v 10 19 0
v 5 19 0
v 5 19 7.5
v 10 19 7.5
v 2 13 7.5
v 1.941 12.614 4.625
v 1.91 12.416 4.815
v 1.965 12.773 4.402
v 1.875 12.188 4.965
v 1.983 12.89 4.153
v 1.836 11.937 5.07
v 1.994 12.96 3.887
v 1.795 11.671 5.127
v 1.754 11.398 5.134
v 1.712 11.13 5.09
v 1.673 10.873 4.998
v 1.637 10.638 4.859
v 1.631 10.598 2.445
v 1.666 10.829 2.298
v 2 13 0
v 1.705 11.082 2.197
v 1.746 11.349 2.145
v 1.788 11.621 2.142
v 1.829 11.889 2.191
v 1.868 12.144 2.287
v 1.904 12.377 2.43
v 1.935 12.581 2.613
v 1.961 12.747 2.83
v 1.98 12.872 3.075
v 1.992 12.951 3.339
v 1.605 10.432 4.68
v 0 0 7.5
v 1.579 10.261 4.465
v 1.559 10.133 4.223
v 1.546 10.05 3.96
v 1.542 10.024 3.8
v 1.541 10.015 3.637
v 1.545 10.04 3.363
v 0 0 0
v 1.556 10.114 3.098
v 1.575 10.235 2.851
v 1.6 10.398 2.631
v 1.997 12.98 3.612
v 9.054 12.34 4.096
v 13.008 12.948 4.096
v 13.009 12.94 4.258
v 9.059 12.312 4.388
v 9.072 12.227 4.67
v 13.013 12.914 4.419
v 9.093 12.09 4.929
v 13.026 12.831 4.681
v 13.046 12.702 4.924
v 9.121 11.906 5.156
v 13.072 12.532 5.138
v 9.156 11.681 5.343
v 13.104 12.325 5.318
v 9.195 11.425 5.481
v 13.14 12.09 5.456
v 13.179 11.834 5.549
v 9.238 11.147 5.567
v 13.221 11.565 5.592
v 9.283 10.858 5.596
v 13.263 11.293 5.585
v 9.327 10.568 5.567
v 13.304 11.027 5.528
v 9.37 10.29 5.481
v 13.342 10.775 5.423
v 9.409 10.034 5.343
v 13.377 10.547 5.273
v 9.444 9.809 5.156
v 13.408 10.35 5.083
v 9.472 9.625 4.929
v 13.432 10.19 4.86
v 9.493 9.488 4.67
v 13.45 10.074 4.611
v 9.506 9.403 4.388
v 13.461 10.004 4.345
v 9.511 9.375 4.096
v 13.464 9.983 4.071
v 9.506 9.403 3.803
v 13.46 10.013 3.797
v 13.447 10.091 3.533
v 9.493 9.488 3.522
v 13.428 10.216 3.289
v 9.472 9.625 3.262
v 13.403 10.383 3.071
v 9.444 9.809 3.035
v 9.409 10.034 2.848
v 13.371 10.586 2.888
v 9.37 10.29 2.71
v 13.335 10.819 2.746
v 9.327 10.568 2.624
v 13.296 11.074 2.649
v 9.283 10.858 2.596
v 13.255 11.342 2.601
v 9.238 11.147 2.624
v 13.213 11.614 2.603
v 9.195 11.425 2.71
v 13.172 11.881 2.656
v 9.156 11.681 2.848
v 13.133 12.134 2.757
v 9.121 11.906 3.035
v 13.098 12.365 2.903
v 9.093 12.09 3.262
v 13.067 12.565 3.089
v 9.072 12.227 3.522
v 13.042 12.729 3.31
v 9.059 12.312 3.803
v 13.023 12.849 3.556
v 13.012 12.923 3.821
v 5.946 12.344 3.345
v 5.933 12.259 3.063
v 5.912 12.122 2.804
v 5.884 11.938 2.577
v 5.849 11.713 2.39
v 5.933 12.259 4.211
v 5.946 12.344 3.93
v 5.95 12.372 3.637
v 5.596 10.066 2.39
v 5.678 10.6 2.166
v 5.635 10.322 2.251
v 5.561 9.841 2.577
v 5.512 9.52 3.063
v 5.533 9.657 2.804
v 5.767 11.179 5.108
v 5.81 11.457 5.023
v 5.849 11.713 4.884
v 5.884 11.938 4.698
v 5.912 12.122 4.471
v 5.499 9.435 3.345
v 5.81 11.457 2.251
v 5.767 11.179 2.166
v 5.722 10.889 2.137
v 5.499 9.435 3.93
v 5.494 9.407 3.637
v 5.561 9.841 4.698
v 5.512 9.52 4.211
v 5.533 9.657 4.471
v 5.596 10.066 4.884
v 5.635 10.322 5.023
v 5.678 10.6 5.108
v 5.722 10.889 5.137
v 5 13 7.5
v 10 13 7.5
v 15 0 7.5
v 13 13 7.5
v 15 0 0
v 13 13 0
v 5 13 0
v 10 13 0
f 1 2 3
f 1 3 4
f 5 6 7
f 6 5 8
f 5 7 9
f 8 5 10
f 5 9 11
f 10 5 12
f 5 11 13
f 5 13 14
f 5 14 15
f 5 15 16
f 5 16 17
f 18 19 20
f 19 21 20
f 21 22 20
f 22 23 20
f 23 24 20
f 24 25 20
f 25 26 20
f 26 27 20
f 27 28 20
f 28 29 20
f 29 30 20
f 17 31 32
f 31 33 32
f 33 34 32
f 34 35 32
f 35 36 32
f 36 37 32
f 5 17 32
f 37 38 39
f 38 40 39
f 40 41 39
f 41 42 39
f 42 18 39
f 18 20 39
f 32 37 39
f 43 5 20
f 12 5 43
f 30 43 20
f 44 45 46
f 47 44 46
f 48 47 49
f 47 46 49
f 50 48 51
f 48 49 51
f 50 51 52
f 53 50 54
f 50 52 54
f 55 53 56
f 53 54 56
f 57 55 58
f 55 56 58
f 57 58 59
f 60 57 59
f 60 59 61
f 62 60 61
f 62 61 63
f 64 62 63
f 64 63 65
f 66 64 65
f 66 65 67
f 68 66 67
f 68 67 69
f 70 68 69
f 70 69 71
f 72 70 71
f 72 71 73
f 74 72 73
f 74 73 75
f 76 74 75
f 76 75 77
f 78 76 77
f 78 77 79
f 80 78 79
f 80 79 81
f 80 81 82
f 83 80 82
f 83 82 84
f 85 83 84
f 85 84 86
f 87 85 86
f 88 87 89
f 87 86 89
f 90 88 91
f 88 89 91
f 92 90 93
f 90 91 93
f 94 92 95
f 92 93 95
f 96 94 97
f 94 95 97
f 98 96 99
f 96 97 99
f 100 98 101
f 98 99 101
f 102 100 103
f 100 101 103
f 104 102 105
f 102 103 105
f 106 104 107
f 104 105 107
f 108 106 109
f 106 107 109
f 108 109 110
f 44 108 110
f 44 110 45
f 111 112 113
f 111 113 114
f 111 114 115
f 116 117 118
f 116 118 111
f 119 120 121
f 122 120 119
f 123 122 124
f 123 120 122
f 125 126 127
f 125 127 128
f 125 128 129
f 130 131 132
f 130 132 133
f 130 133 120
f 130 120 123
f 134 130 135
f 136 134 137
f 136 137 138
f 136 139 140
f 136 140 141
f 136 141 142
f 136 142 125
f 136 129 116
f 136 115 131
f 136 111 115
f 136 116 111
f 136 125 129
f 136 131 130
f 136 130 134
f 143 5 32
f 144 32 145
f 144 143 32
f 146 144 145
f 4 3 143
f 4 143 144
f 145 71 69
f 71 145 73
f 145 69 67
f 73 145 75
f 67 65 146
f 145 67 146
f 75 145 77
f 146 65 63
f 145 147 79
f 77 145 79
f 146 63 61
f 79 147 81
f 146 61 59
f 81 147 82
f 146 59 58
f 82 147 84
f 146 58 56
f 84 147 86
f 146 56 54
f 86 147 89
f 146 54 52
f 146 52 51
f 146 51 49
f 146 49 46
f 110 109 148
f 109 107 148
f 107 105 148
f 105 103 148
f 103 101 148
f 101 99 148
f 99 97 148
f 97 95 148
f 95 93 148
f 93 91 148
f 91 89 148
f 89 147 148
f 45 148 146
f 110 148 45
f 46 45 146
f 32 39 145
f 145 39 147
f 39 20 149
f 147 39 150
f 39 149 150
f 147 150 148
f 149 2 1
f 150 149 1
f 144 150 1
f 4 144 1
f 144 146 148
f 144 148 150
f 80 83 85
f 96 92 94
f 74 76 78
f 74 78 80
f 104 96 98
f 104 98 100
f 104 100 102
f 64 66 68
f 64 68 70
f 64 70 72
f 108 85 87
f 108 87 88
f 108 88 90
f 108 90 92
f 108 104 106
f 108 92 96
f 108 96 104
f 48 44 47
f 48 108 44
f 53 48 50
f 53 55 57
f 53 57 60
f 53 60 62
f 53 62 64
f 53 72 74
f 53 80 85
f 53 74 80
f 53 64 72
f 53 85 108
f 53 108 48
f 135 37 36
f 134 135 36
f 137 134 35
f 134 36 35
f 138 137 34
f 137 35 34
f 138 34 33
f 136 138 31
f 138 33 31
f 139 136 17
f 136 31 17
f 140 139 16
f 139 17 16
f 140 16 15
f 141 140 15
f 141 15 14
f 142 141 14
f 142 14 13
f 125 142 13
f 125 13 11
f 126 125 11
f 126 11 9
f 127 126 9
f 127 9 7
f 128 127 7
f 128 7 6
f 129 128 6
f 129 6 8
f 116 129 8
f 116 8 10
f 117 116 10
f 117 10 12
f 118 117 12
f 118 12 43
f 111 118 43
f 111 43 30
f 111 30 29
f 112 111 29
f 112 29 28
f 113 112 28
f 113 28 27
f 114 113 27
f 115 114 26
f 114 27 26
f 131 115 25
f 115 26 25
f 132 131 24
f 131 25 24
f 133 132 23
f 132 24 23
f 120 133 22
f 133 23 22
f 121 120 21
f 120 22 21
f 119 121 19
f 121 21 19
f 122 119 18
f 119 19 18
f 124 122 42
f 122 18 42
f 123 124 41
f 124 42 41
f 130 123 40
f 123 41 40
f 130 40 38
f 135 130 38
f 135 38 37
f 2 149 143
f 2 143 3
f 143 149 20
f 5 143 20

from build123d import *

# Parameters (mm, degrees)
F0_W     = 5
F0_H     = 6
F1_DEPTH = 7.5
F2_R     = 1.5
F3_DEPTH = 4
F4_R     = 1.5
F5_DEPTH = 4


with BuildPart() as f1:
    # F0 (on Top) → F1 (new body)
    with BuildSketch(Plane.XY):
        with Locations((7.5, 16)):
            Rectangle(F0_W, F0_H)
        Polygon((2, 13), (0, 0), (15, 0), (13, 13), (10, 13), (5, 13), align=None)
    extrude(amount=F1_DEPTH)

    # F2 (on face) → F3 (cut)
    with BuildSketch(Plane(origin=(14.653179, 2.254335, 0), x_dir=(-0.152057, 0.988372, 0), z_dir=(0.988372, 0.152057, 0))):
        with Locations((9.319803, 4.095583)):
            Circle(F2_R)
    extrude(amount=-F3_DEPTH, mode=Mode.SUBTRACT)

    # F4 (on face) → F5 (cut)
    with BuildSketch(Plane(origin=(0, 0, 0), x_dir=(-0.152057, -0.988372, 0), z_dir=(-0.988372, 0.152057, 0))):
        with Locations((-11.632966, 3.637236)):
            Circle(F4_R)
    extrude(amount=-F5_DEPTH, mode=Mode.SUBTRACT)


solid = f1.part
